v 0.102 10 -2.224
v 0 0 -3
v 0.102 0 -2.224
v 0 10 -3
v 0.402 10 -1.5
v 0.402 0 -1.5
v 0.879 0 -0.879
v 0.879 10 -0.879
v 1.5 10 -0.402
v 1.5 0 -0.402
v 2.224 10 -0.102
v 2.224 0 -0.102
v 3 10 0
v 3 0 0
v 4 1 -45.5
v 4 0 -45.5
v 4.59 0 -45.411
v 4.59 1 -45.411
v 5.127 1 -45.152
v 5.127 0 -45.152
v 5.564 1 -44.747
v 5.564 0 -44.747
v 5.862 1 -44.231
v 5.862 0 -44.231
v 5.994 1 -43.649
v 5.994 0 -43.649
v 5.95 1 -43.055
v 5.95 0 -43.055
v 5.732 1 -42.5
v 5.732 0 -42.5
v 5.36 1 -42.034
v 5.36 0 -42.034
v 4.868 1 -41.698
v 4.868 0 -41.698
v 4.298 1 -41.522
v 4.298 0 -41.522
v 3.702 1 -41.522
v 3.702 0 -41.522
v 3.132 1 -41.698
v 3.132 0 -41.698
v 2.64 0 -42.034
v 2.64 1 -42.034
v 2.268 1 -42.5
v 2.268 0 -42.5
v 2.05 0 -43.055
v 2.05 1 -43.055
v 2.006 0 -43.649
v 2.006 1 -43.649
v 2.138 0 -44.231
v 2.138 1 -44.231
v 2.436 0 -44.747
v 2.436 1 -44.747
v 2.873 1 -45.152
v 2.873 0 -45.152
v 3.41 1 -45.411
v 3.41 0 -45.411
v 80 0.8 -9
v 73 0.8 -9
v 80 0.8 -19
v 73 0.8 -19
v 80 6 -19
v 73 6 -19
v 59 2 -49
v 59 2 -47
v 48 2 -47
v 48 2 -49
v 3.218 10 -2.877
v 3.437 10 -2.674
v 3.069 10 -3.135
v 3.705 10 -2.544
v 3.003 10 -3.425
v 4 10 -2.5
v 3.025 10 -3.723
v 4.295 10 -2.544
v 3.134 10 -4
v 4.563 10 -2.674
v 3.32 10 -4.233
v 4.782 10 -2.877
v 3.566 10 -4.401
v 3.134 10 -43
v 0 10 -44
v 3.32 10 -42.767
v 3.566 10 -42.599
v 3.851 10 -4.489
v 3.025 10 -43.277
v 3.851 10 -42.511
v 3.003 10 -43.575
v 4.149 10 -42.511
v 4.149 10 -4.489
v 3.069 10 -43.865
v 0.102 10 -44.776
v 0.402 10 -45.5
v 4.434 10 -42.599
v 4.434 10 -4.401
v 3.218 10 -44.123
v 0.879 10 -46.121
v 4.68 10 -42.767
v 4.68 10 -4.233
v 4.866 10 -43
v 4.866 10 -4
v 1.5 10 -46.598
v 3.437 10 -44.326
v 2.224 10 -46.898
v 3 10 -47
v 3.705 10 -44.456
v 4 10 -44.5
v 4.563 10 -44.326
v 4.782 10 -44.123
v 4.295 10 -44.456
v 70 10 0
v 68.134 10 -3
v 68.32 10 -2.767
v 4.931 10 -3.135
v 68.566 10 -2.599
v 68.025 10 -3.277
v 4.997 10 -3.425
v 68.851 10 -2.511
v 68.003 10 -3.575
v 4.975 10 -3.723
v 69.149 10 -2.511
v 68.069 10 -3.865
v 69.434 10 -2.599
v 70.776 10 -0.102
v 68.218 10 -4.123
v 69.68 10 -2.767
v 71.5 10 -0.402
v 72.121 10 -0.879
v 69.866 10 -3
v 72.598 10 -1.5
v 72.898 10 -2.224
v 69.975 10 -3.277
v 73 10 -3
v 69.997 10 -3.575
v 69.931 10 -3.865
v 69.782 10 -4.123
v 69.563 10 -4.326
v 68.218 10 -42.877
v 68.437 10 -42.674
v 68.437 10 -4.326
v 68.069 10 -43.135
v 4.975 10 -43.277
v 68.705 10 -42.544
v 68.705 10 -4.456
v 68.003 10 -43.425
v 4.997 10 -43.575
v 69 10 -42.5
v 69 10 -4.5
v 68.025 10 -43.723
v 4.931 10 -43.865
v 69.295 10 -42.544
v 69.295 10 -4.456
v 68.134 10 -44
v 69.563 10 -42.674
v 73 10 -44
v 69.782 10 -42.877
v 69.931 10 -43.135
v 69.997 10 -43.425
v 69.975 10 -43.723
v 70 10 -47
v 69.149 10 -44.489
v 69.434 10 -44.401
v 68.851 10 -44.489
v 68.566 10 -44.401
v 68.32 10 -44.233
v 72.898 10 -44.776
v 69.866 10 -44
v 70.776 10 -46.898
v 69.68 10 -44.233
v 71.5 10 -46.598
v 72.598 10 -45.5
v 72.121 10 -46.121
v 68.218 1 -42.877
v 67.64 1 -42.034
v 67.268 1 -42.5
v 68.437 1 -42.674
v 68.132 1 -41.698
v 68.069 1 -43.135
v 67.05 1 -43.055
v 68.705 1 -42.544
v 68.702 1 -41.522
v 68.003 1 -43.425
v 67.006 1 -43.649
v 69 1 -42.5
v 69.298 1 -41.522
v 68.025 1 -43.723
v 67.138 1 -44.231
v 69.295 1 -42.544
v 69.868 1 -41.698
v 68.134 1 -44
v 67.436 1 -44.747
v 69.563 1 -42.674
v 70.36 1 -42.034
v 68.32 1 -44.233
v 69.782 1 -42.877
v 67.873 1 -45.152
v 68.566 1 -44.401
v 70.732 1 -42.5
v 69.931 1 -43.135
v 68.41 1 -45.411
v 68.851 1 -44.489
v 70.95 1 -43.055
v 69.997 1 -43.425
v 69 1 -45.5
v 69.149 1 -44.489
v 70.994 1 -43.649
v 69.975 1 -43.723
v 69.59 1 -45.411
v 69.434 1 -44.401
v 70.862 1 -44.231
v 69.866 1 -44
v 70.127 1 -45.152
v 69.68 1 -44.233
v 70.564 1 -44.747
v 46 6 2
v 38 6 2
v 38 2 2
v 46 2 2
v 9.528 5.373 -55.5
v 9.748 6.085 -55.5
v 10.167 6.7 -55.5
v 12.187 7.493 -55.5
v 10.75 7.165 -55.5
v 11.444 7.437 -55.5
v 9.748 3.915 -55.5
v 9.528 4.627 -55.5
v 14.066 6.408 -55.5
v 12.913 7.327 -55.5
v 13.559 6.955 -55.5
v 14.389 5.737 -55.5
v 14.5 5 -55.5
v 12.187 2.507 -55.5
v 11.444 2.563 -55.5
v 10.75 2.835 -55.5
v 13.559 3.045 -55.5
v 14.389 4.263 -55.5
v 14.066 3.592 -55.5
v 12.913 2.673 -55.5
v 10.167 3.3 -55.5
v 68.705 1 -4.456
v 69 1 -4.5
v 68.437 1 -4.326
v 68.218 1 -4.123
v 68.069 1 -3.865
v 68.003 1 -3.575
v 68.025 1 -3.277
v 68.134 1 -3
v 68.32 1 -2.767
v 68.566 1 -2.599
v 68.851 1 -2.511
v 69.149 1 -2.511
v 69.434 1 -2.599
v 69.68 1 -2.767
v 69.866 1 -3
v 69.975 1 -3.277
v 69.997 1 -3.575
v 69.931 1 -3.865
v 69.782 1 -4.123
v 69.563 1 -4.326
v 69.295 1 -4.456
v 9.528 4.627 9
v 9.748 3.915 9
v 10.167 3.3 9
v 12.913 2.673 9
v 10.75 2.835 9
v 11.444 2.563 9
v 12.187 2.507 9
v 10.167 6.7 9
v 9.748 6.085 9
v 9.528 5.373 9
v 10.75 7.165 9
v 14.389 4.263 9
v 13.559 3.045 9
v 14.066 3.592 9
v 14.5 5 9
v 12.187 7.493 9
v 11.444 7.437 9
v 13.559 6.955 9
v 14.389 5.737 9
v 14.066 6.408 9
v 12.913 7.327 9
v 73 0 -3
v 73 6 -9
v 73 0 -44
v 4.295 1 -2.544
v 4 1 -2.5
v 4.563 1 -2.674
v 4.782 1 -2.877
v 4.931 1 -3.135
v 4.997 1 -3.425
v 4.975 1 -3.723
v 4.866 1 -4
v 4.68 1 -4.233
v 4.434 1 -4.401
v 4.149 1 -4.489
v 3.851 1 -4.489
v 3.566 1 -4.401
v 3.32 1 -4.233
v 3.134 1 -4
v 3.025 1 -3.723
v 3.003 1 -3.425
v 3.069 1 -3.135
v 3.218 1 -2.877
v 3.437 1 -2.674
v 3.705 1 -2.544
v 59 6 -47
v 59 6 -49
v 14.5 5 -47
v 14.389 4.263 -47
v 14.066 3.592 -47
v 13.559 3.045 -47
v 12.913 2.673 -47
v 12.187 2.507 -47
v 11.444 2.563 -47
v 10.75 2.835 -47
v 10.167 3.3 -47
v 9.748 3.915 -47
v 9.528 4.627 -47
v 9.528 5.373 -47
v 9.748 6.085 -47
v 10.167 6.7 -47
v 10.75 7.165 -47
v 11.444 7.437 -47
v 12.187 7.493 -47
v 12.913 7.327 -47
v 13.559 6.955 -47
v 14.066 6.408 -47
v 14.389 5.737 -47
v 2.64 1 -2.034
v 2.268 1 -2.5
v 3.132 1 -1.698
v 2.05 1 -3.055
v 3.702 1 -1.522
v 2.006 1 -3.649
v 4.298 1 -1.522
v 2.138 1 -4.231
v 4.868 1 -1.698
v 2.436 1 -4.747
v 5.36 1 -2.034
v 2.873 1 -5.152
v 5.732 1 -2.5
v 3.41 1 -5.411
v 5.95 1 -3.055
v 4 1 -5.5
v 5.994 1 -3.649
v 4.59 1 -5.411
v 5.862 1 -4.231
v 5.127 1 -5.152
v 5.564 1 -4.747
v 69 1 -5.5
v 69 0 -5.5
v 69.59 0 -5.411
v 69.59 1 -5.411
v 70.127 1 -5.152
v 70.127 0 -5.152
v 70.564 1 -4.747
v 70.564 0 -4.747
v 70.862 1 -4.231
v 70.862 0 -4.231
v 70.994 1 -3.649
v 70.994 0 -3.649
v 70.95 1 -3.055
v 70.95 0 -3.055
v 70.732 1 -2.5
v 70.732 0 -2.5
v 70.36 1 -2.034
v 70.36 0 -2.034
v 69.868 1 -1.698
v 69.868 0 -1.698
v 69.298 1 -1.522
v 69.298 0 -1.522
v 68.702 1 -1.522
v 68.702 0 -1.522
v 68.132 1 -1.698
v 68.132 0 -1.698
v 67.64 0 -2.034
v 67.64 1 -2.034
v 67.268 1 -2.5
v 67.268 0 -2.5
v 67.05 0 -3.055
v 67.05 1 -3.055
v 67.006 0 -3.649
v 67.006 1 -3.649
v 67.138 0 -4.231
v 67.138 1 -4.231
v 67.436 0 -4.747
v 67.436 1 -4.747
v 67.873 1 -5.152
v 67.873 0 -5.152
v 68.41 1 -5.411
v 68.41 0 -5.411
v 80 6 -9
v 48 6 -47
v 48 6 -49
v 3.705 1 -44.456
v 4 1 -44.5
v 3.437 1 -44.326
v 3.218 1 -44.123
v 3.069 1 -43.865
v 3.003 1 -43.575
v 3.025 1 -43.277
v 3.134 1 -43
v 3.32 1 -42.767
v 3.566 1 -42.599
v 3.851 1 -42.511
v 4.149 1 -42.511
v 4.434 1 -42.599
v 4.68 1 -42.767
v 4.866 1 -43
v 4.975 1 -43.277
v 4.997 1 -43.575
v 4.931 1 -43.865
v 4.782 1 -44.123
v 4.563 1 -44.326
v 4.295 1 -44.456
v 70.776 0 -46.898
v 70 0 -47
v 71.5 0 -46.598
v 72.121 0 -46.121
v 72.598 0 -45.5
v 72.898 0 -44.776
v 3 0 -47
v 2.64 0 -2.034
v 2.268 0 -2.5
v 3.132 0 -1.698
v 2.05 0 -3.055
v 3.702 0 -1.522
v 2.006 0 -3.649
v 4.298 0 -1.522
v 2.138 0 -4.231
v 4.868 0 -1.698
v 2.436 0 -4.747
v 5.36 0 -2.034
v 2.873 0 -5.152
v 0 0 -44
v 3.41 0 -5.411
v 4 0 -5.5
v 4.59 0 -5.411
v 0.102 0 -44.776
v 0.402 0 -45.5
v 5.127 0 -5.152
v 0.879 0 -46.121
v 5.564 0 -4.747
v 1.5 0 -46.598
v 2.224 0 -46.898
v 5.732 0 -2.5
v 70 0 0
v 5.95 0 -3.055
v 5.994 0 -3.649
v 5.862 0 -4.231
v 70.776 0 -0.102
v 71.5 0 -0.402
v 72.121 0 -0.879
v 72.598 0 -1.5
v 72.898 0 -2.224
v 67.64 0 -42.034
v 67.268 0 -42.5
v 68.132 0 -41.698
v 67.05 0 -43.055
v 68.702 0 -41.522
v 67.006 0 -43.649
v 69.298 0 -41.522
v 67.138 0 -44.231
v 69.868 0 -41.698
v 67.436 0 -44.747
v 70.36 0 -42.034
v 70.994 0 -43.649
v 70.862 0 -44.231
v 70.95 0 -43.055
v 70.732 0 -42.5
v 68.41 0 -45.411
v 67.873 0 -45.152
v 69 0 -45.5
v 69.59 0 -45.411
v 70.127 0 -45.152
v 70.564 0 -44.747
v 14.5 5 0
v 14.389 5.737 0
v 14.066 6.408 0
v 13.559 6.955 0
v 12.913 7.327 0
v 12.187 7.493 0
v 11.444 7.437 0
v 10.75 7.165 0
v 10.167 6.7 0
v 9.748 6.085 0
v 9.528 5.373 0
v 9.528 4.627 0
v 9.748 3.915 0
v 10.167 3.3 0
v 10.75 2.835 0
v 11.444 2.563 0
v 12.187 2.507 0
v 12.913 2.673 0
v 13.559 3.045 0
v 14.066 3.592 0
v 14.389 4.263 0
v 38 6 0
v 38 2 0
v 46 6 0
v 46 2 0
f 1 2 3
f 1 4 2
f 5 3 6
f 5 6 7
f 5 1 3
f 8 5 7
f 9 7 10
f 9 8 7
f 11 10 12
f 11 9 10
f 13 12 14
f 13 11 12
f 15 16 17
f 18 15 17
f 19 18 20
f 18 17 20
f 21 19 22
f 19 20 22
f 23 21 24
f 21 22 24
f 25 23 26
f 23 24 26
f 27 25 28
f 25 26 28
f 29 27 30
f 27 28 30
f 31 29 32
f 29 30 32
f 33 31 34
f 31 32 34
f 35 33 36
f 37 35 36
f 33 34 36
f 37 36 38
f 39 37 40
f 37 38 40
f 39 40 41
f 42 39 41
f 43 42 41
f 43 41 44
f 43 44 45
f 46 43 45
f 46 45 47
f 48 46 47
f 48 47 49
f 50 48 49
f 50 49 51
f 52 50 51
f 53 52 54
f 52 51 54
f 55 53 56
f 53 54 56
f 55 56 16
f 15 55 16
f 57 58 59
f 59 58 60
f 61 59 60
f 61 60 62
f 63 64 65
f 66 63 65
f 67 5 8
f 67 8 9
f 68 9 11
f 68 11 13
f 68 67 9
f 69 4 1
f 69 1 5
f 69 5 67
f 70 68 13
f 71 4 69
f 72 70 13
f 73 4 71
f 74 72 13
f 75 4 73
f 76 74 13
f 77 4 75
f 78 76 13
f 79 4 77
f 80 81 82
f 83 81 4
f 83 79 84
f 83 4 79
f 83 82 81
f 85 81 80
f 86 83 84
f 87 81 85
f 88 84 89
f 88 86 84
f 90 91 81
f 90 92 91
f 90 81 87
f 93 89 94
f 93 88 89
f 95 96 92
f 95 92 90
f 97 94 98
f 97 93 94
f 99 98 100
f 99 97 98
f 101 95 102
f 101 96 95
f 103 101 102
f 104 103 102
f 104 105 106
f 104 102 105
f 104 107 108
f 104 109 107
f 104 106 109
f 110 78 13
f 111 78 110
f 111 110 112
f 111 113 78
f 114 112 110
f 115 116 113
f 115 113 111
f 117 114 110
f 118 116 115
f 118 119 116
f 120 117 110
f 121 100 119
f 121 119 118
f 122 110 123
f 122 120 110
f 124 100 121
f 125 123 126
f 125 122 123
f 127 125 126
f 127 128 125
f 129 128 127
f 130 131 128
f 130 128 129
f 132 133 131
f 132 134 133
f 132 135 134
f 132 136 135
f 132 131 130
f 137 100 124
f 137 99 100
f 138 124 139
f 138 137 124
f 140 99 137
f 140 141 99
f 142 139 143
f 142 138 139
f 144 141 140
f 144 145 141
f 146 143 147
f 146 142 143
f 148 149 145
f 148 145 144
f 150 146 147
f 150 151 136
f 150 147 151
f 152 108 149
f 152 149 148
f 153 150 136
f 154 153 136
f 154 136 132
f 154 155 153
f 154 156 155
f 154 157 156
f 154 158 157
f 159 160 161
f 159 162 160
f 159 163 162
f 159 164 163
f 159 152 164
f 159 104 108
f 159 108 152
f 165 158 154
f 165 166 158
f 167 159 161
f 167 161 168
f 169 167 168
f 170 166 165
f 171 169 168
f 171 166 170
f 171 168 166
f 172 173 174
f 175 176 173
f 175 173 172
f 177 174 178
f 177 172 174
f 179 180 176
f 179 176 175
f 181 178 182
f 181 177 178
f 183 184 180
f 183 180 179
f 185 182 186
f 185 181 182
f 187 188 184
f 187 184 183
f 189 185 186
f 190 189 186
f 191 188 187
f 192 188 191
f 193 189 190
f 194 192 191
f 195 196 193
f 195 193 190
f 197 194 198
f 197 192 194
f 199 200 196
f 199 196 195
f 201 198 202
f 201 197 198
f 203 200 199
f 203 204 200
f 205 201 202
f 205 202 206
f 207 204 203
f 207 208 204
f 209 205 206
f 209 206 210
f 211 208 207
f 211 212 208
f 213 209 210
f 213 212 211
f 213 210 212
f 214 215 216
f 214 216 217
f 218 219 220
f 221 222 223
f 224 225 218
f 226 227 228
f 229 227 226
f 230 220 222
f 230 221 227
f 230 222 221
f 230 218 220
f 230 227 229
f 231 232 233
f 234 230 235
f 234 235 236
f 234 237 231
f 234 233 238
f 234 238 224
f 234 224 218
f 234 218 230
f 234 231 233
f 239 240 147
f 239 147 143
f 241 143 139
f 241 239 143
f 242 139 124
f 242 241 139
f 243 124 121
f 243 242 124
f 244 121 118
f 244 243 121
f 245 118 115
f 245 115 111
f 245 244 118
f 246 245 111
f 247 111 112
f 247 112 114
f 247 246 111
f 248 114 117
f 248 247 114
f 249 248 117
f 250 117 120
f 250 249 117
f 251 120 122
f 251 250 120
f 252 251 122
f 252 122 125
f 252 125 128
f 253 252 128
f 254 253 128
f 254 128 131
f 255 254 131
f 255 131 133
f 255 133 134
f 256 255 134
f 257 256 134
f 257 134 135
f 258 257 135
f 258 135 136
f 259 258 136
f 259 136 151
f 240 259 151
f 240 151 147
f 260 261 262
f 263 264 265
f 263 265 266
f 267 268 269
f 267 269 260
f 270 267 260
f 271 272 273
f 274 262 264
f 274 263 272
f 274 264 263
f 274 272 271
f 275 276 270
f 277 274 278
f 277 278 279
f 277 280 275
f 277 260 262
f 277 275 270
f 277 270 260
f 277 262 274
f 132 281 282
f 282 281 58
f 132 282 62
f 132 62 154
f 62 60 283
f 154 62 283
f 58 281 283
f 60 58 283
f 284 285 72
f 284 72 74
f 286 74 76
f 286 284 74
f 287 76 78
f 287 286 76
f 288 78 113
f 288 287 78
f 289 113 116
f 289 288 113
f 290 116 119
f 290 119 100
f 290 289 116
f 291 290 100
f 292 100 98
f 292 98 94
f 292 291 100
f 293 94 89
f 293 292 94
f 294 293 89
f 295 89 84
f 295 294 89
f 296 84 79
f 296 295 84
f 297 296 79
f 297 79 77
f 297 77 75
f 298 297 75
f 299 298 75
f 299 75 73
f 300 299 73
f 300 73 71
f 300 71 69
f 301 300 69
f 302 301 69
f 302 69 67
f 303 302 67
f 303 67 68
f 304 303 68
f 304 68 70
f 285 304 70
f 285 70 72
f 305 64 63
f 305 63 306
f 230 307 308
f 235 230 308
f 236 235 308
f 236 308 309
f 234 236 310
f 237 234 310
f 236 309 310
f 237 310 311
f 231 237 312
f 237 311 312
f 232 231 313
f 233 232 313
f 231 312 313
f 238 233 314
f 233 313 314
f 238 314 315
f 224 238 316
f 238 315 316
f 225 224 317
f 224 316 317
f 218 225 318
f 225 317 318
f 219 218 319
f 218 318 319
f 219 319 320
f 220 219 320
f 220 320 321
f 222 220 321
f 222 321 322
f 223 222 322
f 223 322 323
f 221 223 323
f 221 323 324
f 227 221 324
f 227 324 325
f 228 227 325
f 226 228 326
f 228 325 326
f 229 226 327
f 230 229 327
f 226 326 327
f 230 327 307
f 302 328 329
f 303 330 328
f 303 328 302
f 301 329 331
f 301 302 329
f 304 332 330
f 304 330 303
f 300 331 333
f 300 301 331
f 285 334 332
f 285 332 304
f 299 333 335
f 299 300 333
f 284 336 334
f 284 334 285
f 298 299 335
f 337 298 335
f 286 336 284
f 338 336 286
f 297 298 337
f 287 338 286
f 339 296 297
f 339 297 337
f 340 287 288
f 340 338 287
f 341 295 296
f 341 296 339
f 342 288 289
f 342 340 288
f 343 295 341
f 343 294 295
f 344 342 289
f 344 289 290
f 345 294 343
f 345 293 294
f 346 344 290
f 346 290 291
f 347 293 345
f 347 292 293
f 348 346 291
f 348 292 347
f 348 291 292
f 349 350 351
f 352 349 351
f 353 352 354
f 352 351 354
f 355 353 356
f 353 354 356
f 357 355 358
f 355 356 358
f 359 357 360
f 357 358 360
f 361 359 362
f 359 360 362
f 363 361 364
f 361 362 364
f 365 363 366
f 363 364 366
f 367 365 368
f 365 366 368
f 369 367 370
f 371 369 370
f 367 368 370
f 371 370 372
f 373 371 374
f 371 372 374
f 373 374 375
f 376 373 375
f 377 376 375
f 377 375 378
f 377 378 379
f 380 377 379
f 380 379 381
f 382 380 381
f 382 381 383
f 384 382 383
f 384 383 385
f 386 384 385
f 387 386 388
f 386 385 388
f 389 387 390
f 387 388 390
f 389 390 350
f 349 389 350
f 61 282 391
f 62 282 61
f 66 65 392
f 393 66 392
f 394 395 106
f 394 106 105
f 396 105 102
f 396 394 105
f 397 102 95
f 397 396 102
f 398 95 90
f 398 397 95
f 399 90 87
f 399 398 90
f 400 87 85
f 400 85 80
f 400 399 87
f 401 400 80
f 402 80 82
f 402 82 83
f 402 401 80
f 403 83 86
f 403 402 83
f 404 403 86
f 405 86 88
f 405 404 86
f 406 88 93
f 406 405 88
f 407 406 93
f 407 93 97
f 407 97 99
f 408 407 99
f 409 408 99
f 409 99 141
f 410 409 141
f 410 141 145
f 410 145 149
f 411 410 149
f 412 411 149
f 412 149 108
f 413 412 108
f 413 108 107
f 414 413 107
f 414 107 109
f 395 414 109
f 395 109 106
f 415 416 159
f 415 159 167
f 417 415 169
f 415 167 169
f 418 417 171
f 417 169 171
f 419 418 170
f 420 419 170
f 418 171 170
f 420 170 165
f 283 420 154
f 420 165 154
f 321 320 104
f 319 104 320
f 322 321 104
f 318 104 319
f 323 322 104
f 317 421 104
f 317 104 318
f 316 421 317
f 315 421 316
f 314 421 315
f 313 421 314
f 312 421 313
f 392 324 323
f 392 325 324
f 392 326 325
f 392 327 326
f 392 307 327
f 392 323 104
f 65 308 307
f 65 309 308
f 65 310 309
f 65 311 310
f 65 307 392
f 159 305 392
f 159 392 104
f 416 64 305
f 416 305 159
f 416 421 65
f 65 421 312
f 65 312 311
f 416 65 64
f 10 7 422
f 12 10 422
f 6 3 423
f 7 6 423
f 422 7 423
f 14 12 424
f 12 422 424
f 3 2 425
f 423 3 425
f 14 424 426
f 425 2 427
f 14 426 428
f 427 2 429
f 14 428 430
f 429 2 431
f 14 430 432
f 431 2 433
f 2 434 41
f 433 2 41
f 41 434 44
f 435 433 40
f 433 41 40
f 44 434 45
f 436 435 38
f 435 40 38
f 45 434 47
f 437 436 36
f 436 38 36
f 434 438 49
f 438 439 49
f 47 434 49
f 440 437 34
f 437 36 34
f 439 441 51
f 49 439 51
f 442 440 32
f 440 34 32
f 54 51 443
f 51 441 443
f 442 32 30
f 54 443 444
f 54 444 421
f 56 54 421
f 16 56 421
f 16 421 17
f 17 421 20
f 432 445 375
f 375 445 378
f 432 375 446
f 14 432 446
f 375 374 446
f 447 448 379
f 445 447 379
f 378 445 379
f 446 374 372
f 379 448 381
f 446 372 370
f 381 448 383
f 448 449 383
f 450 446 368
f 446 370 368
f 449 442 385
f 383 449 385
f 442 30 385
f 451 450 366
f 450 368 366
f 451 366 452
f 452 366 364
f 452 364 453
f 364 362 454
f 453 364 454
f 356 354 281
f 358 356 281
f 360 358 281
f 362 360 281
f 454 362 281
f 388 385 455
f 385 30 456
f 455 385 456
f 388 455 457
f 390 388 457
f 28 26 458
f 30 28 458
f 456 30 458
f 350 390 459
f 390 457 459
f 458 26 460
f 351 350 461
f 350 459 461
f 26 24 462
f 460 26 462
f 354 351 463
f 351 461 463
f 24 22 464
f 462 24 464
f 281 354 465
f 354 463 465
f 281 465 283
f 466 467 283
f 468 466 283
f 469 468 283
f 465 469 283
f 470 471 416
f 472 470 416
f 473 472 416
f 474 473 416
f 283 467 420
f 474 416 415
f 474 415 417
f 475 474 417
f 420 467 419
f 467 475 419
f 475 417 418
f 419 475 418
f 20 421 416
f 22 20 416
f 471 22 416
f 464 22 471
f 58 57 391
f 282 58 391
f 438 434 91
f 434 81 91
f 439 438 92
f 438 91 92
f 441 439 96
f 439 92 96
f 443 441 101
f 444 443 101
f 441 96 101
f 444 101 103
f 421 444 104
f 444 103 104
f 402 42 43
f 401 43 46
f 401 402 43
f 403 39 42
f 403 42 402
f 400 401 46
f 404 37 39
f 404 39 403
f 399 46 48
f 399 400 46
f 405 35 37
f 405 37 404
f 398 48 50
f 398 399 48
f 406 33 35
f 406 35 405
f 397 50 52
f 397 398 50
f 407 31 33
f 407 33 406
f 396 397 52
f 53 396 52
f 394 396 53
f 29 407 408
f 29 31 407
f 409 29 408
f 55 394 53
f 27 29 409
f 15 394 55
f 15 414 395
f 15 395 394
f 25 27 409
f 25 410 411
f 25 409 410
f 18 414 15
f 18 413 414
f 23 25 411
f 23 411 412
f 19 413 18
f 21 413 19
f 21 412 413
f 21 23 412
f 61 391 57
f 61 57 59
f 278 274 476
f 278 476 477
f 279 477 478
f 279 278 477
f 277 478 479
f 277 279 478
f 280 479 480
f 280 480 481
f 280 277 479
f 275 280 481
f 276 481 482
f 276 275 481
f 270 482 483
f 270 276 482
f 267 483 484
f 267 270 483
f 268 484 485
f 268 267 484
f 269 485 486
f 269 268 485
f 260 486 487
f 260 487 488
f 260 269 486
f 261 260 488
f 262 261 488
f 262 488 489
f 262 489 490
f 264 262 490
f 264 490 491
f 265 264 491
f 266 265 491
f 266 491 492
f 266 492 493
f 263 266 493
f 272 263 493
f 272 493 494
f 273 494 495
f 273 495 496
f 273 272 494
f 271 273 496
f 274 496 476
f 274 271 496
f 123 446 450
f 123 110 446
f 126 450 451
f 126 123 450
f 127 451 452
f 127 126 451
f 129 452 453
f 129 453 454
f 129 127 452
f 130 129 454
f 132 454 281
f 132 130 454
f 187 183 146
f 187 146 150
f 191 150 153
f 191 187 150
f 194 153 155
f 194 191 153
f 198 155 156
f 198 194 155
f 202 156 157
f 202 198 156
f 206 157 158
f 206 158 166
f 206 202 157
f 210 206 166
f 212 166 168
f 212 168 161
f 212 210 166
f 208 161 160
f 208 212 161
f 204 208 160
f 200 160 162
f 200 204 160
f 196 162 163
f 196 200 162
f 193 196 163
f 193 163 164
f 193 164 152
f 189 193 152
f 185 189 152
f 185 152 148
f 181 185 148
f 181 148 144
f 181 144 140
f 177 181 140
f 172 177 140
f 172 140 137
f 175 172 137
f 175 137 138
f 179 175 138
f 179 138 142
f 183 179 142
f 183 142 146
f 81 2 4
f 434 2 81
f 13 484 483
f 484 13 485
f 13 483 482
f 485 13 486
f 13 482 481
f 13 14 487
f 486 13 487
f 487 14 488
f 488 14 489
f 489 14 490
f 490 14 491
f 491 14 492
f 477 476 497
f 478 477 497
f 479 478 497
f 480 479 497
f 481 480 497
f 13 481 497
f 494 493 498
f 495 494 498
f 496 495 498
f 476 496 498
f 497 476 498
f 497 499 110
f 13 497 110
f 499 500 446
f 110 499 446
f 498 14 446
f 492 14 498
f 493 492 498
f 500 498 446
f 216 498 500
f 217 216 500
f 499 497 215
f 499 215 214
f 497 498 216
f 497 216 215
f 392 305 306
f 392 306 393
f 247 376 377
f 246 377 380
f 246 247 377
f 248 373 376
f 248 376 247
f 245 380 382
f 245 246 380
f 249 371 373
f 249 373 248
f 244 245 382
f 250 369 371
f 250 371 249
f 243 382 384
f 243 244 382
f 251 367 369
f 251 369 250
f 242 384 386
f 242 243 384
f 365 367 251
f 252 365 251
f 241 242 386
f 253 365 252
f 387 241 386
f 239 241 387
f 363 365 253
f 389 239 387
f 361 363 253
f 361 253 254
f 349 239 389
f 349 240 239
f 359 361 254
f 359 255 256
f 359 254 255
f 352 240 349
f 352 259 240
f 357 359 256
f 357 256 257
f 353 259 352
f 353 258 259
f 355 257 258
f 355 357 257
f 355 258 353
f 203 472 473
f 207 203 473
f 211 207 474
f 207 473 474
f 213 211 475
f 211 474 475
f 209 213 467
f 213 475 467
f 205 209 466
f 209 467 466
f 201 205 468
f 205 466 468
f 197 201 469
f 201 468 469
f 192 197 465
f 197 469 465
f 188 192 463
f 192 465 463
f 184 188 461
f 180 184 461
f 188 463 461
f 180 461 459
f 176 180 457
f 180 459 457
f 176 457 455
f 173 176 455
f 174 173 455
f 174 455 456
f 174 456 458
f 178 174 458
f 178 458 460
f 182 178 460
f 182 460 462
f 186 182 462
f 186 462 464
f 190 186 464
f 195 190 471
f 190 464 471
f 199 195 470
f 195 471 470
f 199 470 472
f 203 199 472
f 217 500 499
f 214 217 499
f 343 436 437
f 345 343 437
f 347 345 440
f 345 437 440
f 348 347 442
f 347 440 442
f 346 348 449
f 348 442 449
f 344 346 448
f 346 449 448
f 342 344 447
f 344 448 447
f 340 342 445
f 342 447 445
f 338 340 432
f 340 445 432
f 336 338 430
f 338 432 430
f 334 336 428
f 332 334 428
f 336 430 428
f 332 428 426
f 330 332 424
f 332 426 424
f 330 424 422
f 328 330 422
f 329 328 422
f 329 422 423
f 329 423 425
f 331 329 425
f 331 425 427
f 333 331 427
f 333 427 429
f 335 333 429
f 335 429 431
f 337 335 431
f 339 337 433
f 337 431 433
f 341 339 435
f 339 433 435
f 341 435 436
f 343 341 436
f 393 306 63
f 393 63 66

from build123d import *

# Parameters (mm, degrees)
SKETCH_1_W          = 73
SKETCH_1_H          = 47
SKETCH_1_R          = 1
EXTRUDE_1_DEPTH     = 10
FILLET_1_R          = 3
SKETCH_3_R          = 2
CUT_EXTRUDE_1_DEPTH = 1
SKETCH_2_R          = 2.5
EXTRUDE_2_DEPTH     = 8.5
EXTRUDE_START       = 9
SKETCH_5_R          = 2.5
EXTRUDE_3_DEPTH     = 9
SKETCH_6_W          = 8
SKETCH_6_H          = 4
LAN_DEPTH           = 2
SKETCH_7_W          = 11
SKETCH_7_H          = 4
COM_DEPTH           = 2
SKETCH_8_W          = 10
SKETCH_8_H          = 5.2
XT30_DEPTH          = 7


with BuildPart() as part:
    # 草图1 → 凸台-拉伸1 (new body)
    with BuildSketch(Plane(origin=(0, 0, 0), x_dir=(1, 0, 0), z_dir=(0, 1, 0))):
        with Locations((36.5, 23.5)):
            Rectangle(SKETCH_1_W, SKETCH_1_H)
        with Locations(Location((4, 3.5, 0), (0, 0, 270))):
            Circle(SKETCH_1_R, mode=Mode.SUBTRACT)
        with Locations(Location((4, 43.5, 0), (0, 0, 90))):
            Circle(SKETCH_1_R, mode=Mode.SUBTRACT)
        with Locations(Location((69, 3.5, 0), (0, 0, 90))):
            Circle(SKETCH_1_R, mode=Mode.SUBTRACT)
        with Locations(Location((69, 43.5, 0), (0, 0, 270))):
            Circle(SKETCH_1_R, mode=Mode.SUBTRACT)
    extrude(amount=EXTRUDE_1_DEPTH)

    # 圆角1
    fillet_1_edges = [part.edges().sort_by_distance(p)[0] for p in [
        (0, 5, -47),
        (73, 5, -47),
        (73, 5, 0),
        (0, 5, 0),
    ]]
    fillet(fillet_1_edges, radius=FILLET_1_R)

    # 草图3 → 切除-拉伸1 (cut)
    with BuildSketch(Plane.XZ):
        with Locations(Location((4, -43.5, 0), (0, 0, 270))):
            Circle(SKETCH_3_R)
        with Locations(Location((4, -3.5, 0), (0, 0, 270))):
            Circle(SKETCH_3_R)
        with Locations(Location((69, -3.5, 0), (0, 0, 270))):
            Circle(SKETCH_3_R)
        with Locations(Location((69, -43.5, 0), (0, 0, 270))):
            Circle(SKETCH_3_R)
    extrude(amount=-CUT_EXTRUDE_1_DEPTH, mode=Mode.SUBTRACT)

    # 草图2 → 凸台-拉伸2 (add)
    with BuildSketch(Plane(origin=(0, 0, -47), x_dir=(-1, 0, 0), z_dir=(0, 0, -1))):
        with Locations(Location((-12, 5, 0), (0, 0, 180))):
            Circle(SKETCH_2_R)
    extrude(amount=EXTRUDE_2_DEPTH)

    # 草图5 → 凸台-拉伸3 (add)
    with BuildSketch(Plane.XY.offset(EXTRUDE_START)):
        with Locations((12, 5)):
            Circle(SKETCH_5_R)
    extrude(amount=-EXTRUDE_3_DEPTH)

    # 草图6 → LAN口预留 (add)
    with BuildSketch(Plane.XY):
        with Locations((42, 4)):
            Rectangle(SKETCH_6_W, SKETCH_6_H)
    extrude(amount=LAN_DEPTH)

    # 草图7 → COM口预留 (add)
    with BuildSketch(Plane(origin=(0, 0, -47), x_dir=(-1, 0, 0), z_dir=(0, 0, -1))):
        with Locations((-53.5, 4)):
            Rectangle(SKETCH_7_W, SKETCH_7_H)
    extrude(amount=COM_DEPTH)

    # 草图8 → XT30预留 (add)
    with BuildSketch(Plane(origin=(73, 0, 0), x_dir=(0, 0, -1), z_dir=(1, 0, 0))):
        with Locations((14, 3.4)):
            Rectangle(SKETCH_8_W, SKETCH_8_H)
    extrude(amount=XT30_DEPTH)


solid = part.part
